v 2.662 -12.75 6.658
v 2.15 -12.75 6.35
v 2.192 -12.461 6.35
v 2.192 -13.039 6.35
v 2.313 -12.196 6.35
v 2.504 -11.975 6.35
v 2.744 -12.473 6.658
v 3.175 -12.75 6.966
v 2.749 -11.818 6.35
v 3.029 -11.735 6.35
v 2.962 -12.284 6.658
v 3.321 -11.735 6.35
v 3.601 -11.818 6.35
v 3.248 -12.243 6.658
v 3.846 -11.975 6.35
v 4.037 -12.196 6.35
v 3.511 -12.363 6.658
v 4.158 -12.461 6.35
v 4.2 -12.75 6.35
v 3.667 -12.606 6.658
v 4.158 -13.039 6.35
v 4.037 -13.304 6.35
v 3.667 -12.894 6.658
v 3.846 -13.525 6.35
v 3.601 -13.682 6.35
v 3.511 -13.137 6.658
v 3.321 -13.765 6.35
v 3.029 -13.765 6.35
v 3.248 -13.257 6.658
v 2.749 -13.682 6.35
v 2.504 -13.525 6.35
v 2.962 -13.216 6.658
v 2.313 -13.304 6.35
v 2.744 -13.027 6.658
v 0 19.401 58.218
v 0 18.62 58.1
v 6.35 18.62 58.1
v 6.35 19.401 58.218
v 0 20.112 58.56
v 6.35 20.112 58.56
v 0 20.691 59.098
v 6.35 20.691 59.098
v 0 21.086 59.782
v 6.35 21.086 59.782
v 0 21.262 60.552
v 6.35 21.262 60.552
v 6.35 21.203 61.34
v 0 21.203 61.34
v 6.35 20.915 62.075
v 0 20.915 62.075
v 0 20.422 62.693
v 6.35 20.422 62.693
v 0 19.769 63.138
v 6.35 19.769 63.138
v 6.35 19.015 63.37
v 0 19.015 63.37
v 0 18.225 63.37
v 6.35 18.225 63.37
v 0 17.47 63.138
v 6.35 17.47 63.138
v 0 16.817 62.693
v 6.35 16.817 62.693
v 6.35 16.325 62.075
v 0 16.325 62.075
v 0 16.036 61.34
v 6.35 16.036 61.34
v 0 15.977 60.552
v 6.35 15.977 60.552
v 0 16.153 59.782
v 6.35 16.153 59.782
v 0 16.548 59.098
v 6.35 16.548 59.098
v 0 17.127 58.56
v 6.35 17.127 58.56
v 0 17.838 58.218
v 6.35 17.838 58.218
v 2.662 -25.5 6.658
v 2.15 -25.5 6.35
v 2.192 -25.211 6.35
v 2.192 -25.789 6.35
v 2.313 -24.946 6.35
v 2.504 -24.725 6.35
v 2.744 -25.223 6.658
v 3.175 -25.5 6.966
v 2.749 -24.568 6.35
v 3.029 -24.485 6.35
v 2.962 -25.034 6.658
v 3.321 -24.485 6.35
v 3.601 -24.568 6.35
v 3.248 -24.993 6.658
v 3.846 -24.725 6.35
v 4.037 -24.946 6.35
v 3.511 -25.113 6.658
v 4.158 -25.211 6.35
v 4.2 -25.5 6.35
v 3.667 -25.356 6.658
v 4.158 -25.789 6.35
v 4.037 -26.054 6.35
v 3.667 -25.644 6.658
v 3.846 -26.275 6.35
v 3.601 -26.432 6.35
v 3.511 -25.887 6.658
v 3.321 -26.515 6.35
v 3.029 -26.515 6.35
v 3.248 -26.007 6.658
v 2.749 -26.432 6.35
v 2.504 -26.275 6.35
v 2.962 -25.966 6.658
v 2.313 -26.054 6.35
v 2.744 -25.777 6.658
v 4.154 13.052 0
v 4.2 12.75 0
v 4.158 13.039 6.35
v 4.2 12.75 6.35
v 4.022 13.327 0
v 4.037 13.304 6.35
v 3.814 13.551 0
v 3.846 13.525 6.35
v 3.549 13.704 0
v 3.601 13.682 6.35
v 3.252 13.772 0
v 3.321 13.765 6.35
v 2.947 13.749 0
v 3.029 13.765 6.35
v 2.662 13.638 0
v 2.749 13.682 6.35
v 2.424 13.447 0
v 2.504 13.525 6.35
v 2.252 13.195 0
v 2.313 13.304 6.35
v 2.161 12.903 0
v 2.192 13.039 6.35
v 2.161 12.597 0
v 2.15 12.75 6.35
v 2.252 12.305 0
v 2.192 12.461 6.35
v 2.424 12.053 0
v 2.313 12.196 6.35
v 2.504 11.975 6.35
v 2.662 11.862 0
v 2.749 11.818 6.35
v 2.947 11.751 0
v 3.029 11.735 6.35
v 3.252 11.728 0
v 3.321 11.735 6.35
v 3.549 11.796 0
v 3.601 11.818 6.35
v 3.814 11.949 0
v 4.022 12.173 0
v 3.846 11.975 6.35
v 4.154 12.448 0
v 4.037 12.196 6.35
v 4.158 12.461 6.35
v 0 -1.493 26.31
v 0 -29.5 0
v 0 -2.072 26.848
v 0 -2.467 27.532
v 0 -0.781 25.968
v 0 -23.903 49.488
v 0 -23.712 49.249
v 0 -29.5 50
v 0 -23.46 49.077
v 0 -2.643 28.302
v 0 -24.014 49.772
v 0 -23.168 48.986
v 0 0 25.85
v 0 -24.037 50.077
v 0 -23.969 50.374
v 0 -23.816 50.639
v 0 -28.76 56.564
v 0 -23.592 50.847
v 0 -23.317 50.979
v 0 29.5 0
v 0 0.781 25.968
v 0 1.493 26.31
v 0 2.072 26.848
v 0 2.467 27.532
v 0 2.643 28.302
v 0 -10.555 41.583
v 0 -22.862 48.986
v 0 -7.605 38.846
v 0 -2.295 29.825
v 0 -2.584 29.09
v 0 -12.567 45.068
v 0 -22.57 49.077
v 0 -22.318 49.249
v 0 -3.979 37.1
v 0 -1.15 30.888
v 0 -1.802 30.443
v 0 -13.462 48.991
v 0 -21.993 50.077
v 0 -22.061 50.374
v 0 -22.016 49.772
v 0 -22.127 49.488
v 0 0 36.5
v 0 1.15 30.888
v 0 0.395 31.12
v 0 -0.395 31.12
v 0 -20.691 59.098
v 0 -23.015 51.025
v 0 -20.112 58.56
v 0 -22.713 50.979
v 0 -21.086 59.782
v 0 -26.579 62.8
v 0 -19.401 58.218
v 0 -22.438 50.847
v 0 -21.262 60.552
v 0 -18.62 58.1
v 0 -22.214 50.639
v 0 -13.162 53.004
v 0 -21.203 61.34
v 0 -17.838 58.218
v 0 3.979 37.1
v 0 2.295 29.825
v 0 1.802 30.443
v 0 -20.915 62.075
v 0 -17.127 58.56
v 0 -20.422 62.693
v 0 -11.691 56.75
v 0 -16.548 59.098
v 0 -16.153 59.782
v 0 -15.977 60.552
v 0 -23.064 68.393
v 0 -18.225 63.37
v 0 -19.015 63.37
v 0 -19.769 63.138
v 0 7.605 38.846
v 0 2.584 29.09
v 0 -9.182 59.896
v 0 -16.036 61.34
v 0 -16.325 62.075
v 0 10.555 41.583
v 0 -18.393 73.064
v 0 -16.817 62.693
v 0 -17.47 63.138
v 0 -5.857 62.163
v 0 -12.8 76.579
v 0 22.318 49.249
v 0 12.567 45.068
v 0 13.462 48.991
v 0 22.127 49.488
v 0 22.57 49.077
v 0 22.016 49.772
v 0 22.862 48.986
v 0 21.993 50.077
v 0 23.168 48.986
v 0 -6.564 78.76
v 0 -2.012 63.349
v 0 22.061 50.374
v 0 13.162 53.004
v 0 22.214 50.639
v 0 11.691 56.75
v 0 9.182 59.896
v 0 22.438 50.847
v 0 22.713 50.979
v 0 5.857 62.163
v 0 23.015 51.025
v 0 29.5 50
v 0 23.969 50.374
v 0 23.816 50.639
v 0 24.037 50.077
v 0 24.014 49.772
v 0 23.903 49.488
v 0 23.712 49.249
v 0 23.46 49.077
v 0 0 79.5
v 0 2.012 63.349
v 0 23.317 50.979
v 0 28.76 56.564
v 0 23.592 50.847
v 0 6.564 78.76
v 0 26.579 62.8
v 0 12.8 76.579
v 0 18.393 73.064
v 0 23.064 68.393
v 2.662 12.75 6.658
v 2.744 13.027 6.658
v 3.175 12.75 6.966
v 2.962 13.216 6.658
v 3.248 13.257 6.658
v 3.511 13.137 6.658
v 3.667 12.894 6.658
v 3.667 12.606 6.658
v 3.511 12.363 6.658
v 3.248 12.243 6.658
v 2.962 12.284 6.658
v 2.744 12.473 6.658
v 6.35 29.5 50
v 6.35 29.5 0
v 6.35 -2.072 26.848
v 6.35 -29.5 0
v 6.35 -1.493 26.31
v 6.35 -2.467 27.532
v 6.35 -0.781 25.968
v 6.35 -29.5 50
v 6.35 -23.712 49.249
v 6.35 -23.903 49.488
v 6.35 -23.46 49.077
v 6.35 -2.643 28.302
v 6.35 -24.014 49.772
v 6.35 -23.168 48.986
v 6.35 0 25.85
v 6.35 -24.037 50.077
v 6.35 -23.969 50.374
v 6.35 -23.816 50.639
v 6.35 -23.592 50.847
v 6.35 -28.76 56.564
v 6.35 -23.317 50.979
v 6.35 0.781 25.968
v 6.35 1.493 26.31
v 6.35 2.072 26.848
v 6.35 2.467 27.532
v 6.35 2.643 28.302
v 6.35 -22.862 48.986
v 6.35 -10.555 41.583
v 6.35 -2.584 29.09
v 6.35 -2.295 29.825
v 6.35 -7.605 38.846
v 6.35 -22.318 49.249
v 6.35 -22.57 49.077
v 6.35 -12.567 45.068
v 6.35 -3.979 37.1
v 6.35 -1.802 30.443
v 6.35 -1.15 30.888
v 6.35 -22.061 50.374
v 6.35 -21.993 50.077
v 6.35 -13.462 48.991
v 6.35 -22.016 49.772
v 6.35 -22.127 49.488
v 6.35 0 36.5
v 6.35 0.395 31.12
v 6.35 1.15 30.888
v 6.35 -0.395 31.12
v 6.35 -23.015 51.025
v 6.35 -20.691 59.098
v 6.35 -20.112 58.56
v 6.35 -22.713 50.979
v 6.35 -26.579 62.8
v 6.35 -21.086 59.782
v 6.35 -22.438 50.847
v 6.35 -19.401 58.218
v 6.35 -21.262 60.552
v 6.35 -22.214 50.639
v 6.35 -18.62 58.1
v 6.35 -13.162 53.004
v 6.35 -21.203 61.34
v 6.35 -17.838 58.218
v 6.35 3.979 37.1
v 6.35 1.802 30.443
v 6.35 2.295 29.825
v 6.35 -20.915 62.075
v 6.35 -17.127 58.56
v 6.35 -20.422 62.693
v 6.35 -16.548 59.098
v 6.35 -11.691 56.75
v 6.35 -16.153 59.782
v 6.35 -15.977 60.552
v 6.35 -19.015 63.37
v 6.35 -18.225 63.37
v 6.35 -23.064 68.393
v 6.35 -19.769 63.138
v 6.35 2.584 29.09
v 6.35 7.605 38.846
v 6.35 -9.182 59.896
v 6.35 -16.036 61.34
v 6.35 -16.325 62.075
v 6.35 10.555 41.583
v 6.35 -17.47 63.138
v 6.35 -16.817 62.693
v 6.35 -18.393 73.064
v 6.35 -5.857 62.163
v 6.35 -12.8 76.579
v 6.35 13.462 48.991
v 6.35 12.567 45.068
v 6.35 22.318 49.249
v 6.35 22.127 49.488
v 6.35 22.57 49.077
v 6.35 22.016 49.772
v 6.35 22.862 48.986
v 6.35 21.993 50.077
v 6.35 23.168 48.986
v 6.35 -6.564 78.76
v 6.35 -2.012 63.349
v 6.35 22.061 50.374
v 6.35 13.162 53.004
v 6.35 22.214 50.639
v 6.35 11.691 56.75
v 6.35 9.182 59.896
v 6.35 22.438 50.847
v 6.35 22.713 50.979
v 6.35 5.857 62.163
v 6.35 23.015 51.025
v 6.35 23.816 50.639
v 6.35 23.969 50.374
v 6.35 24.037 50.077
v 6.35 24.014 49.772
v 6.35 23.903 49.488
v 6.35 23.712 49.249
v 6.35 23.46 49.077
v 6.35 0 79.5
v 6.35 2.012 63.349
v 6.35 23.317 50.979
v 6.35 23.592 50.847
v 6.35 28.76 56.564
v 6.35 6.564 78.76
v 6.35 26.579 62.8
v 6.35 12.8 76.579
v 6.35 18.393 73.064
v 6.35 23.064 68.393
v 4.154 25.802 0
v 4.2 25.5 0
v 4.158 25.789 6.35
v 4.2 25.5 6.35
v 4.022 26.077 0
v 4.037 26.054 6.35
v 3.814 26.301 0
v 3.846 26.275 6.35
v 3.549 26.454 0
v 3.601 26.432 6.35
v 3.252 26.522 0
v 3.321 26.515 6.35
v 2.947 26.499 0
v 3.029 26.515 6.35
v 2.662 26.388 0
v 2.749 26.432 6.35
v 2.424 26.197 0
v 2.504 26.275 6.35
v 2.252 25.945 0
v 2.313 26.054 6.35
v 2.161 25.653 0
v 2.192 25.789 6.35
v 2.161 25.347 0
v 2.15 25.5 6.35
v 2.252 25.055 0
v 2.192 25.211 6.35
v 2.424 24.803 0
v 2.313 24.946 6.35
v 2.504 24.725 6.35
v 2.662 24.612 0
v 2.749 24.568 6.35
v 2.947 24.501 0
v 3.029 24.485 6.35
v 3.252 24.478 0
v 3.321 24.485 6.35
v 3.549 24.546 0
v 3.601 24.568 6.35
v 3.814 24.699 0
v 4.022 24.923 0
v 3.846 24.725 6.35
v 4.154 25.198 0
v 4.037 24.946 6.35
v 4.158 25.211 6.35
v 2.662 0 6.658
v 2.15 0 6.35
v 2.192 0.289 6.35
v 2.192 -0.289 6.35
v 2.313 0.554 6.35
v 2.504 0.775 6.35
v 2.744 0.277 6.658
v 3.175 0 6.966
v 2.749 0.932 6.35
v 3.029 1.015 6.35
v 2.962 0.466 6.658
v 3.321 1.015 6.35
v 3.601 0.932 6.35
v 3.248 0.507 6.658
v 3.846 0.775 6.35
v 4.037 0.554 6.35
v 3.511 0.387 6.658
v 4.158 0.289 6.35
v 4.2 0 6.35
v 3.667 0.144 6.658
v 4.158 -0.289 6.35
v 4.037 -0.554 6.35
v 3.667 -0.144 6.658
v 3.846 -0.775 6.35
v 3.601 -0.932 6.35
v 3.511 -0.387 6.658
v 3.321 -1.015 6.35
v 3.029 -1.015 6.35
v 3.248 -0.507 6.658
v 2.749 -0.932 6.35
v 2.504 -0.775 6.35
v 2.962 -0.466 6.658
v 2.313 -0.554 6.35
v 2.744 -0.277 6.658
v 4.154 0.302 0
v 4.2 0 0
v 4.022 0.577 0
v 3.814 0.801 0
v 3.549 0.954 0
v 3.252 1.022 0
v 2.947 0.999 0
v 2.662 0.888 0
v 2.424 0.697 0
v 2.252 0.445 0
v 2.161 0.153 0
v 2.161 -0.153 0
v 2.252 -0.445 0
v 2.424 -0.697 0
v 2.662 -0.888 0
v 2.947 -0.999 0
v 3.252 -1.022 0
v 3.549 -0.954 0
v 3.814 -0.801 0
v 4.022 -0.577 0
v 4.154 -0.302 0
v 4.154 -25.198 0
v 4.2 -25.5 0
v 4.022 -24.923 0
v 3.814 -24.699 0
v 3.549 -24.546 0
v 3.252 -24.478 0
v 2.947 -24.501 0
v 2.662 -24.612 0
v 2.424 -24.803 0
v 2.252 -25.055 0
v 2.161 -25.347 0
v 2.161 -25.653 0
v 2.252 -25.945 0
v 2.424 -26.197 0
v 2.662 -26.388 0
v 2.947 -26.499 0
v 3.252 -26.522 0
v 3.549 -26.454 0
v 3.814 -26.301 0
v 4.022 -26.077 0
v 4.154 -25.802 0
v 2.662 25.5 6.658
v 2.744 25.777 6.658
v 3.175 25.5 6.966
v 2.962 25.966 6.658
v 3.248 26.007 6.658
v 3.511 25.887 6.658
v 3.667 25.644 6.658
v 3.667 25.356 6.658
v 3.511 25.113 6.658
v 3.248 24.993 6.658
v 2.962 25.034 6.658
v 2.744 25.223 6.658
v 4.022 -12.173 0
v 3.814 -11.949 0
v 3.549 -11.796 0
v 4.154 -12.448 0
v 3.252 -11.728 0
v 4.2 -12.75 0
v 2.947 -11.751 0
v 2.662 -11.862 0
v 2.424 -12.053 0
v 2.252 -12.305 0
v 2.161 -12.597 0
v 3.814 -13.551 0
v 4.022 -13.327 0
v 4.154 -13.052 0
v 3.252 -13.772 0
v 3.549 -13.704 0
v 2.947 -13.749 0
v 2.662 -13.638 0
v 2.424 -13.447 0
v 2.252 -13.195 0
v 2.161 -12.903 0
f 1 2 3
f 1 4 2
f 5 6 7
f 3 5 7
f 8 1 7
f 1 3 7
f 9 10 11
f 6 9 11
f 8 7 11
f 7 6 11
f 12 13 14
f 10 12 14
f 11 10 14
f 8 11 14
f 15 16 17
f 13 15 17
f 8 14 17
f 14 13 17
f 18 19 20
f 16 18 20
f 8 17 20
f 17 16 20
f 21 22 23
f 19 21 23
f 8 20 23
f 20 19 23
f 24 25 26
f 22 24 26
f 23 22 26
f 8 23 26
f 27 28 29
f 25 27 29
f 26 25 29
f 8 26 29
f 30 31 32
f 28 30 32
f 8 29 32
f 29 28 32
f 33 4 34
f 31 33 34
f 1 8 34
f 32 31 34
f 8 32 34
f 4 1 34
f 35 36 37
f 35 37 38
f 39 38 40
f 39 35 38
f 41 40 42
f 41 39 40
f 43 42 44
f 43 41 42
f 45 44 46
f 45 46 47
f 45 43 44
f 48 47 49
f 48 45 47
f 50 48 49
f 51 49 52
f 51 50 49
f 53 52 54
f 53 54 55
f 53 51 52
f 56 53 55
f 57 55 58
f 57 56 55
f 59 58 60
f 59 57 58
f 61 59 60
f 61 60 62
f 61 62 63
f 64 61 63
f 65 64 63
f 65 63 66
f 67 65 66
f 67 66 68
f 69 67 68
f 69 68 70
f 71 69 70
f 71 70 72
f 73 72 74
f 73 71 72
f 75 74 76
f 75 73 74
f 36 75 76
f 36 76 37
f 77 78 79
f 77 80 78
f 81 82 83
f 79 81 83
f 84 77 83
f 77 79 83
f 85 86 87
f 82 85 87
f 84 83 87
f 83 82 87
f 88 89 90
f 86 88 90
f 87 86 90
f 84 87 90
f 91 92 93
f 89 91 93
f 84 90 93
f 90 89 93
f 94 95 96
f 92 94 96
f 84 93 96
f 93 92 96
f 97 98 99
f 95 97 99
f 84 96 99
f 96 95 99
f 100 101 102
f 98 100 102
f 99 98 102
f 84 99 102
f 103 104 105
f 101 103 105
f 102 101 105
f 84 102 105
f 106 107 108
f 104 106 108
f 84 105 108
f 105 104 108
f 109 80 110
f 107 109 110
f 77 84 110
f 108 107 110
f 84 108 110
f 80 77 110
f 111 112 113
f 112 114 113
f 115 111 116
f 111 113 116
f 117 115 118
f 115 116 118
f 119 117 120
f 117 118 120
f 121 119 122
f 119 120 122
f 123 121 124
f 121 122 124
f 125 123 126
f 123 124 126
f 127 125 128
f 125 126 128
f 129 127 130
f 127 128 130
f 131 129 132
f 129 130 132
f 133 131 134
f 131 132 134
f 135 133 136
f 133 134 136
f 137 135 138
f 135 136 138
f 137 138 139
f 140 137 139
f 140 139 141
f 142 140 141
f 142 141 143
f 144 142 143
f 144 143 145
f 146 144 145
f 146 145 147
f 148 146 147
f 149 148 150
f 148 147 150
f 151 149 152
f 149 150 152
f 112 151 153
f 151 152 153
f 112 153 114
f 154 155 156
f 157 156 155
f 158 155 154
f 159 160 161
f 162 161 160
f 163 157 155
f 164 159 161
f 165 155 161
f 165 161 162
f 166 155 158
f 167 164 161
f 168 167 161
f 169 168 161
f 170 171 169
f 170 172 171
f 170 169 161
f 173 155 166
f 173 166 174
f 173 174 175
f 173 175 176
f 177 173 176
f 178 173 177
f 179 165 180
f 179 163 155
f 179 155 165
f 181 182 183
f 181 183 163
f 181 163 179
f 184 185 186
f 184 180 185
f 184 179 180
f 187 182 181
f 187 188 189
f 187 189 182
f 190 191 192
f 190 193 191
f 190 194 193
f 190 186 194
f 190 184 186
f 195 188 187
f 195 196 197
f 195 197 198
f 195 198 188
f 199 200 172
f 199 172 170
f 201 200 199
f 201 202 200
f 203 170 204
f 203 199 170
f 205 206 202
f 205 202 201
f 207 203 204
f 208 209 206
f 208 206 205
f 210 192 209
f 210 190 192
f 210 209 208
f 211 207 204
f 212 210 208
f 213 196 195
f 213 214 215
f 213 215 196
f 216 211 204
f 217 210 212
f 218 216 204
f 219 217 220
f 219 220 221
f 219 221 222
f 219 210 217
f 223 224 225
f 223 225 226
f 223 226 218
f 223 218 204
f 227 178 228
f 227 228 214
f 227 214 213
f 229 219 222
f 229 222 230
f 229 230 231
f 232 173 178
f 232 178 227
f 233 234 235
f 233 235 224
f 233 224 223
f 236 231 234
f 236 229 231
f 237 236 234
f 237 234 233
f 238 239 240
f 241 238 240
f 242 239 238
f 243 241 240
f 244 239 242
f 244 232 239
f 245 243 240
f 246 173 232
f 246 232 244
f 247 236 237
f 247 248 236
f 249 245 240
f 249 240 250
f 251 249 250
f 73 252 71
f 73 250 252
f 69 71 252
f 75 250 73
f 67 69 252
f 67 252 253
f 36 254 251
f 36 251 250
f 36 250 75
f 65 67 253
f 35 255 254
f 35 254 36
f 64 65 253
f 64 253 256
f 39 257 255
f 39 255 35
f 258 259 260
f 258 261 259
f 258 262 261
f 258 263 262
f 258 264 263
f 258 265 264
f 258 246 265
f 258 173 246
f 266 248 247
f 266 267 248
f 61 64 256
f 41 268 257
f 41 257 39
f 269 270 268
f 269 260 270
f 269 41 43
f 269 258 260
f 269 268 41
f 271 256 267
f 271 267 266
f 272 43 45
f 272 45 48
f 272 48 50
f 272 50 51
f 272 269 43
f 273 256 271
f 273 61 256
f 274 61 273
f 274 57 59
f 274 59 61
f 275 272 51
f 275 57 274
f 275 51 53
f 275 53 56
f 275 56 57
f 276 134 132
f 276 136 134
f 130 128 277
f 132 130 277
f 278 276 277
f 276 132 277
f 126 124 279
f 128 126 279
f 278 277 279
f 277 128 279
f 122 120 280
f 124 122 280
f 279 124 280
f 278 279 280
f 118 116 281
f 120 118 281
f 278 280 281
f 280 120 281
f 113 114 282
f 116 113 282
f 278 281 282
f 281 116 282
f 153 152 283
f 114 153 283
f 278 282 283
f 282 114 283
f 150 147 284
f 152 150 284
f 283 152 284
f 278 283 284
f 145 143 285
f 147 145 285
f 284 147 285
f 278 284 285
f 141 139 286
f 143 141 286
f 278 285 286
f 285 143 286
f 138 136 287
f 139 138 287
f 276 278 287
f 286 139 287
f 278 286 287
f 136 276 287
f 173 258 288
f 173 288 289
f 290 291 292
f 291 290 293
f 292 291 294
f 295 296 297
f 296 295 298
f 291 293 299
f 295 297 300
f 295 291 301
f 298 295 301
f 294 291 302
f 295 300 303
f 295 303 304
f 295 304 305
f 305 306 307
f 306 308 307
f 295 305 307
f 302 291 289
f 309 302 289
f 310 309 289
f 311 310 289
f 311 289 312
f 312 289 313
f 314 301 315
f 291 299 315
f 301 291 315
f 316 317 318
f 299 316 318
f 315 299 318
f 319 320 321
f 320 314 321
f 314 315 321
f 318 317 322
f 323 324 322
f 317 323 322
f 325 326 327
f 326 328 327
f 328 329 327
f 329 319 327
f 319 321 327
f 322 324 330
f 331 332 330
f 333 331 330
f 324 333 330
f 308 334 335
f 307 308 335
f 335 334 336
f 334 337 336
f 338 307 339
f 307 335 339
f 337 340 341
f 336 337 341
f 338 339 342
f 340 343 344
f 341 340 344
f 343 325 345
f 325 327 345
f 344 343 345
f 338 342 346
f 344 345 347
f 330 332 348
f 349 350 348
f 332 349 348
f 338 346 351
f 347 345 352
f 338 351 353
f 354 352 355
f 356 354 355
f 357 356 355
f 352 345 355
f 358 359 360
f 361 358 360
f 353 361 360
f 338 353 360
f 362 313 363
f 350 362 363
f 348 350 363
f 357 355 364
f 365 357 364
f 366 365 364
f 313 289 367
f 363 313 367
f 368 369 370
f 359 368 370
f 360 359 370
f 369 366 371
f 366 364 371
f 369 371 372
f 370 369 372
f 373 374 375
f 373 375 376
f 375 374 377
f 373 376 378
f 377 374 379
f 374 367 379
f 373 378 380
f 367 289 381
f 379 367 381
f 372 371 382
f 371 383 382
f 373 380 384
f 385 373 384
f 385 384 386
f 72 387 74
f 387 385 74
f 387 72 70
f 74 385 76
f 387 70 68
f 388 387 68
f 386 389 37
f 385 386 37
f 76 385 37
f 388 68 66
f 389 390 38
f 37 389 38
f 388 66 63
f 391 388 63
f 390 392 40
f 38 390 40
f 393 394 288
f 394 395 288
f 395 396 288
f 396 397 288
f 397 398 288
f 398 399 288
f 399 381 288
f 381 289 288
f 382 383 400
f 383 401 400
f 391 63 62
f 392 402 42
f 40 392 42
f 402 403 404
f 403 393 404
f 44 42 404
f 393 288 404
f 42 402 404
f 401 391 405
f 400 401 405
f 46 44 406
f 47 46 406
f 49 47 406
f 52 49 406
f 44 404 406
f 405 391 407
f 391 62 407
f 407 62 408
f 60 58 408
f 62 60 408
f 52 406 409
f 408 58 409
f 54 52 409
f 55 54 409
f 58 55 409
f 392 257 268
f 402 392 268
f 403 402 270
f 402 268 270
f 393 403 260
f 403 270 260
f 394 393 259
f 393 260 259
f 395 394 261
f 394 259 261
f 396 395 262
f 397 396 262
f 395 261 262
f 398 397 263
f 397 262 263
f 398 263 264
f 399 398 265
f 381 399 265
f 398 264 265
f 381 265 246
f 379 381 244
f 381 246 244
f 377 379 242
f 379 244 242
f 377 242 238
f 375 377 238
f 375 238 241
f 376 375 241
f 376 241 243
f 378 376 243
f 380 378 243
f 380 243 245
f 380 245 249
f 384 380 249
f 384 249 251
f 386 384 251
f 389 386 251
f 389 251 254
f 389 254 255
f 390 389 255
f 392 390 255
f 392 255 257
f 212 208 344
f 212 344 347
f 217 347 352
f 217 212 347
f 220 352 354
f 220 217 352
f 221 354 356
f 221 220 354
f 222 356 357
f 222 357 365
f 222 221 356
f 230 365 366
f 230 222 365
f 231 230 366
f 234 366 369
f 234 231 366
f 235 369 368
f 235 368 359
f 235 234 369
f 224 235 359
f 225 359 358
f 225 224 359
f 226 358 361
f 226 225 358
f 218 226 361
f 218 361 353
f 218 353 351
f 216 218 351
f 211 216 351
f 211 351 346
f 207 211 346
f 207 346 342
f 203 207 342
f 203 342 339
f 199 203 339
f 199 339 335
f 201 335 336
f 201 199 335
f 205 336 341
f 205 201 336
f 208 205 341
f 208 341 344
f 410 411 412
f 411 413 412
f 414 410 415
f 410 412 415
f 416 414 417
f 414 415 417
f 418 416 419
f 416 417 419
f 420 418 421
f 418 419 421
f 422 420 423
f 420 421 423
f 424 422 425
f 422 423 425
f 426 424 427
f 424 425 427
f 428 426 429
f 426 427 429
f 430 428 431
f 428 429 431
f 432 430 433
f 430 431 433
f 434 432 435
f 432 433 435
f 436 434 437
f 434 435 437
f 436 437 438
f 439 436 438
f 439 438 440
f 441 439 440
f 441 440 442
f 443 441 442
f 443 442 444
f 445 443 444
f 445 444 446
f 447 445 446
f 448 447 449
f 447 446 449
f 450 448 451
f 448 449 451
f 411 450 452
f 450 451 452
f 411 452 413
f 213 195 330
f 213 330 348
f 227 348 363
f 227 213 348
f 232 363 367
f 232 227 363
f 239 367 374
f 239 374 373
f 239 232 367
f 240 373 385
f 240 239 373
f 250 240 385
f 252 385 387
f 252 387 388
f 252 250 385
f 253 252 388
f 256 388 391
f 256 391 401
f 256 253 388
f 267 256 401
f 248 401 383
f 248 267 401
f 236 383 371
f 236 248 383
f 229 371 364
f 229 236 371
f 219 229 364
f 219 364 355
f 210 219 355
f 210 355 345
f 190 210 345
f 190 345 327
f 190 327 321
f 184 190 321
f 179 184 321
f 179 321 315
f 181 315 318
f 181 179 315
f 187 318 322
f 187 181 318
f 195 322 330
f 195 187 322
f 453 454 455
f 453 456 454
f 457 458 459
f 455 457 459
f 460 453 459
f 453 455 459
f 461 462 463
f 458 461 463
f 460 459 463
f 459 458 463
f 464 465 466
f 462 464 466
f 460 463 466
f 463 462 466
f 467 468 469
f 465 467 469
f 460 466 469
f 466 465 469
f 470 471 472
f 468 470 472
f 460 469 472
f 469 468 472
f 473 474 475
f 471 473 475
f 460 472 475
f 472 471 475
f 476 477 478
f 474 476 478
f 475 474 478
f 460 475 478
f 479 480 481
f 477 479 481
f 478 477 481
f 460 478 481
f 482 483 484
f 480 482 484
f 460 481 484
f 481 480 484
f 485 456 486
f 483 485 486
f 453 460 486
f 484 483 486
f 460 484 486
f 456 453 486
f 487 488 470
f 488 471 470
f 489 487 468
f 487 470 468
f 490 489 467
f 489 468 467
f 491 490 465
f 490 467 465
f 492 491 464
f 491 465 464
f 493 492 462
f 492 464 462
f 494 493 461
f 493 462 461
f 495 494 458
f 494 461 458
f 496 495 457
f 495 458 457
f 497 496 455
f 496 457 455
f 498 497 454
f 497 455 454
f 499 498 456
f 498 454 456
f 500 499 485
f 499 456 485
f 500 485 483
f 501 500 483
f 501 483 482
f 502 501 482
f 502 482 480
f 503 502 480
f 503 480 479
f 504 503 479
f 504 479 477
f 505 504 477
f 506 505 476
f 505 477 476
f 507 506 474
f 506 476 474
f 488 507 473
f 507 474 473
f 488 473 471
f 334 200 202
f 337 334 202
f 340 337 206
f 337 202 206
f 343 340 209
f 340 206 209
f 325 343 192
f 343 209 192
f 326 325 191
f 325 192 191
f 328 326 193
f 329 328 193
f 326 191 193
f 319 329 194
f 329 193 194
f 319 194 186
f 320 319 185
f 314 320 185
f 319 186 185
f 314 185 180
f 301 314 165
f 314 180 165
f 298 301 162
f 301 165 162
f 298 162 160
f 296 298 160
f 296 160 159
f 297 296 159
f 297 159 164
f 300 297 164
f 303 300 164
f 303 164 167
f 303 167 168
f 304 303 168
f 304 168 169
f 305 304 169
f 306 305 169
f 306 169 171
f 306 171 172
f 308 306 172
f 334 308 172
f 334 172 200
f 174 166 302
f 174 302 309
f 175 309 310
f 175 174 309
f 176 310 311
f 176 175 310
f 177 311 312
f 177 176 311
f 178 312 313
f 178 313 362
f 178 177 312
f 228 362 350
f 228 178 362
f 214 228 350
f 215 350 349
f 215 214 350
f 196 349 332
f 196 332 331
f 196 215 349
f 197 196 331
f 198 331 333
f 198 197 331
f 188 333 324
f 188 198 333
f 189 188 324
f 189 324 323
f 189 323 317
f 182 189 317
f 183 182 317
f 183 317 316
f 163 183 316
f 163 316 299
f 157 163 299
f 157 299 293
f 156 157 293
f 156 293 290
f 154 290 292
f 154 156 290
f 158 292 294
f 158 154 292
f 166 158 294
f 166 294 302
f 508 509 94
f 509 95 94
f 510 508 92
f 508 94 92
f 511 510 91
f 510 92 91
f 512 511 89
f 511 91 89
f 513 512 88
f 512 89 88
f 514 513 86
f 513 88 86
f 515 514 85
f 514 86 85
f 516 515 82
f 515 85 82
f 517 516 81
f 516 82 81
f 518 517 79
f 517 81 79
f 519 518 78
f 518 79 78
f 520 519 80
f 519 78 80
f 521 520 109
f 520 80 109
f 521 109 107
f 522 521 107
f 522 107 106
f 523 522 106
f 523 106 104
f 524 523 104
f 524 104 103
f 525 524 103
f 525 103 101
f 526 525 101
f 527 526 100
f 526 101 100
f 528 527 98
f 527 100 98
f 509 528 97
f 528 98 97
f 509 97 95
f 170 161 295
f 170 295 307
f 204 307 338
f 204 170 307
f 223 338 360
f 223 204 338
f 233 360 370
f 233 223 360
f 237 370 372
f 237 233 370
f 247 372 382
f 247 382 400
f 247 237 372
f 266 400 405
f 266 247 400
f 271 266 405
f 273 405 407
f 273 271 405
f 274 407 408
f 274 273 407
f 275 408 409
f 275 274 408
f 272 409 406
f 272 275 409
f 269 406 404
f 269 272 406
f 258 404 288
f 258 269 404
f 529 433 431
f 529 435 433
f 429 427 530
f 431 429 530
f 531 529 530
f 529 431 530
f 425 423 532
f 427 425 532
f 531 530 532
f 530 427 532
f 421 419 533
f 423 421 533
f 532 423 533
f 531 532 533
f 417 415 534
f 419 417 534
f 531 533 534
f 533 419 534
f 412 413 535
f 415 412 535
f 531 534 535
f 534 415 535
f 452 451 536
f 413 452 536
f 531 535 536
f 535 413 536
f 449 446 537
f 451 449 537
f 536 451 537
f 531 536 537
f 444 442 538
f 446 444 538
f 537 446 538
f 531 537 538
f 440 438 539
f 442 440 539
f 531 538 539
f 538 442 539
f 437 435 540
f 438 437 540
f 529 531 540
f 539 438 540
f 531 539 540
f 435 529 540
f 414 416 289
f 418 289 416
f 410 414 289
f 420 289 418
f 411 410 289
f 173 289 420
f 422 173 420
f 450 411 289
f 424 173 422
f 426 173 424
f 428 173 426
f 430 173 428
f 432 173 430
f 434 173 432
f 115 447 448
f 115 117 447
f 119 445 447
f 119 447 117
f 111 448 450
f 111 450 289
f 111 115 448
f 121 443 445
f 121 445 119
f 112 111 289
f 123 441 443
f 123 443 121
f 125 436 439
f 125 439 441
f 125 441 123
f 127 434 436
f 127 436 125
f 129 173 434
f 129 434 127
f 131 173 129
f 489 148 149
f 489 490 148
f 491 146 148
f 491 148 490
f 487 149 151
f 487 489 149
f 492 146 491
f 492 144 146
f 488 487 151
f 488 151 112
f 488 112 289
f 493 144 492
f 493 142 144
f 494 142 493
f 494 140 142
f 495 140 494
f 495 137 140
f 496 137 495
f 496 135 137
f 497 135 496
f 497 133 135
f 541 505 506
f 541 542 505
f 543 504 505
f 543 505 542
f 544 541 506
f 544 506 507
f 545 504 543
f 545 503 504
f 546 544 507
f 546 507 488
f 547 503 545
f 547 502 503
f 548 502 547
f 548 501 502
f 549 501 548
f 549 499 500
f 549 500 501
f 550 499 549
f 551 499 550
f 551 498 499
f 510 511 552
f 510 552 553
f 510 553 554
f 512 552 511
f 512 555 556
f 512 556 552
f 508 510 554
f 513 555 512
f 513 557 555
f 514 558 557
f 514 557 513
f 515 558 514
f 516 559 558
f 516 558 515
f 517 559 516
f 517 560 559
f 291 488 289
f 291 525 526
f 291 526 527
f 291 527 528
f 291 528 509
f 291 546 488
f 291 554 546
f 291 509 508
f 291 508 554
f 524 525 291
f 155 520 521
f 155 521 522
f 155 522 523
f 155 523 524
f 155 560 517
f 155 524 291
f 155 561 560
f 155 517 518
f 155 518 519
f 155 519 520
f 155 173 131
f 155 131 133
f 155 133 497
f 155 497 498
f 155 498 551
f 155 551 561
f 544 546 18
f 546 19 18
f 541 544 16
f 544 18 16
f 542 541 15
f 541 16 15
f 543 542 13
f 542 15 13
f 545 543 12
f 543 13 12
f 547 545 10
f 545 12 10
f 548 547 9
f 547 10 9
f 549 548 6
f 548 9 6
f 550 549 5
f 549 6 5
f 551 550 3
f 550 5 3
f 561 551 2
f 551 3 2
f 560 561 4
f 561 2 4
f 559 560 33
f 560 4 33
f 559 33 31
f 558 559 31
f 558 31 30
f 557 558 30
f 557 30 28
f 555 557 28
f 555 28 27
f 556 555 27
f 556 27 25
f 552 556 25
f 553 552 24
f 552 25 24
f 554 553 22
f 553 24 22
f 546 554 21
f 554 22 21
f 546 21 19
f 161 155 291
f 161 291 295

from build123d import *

# Parameters (mm, degrees)
SKETCH1_R                    = 2.65
SKETCH1_R_2                  = 13.5
BOSS_EXTRUDE1_DEPTH          = 6.35
M2_5X0_45_TAPPED_HOLE1_D     = 2.05
M2_5X0_45_TAPPED_HOLE2_D     = 2.05
M2_5X0_45_TAPPED_HOLE2_DEPTH = 6.35
M2_5X0_45_TAPPED_HOLE2_TIP   = 0.615882135


with BuildPart() as part:
    # Sketch1 → Boss-Extrude1 (new body)
    with BuildSketch(Plane(origin=(0, 0, 0), x_dir=(0, 0, -1), z_dir=(1, 0, 0))):
        with BuildLine():
            Line((-50, 29.5), (0, 29.5))
            Line((0, 29.5), (0, -29.5))
            Line((0, -29.5), (-50, -29.5))
            ThreePointArc((-50, -29.5), (-79.5, 0), (-50, 29.5))
        make_face()
        with Locations((-60.75, -18.619546181)):
            Circle(SKETCH1_R, mode=Mode.SUBTRACT)
        with Locations((-28.5, 0)):
            Circle(SKETCH1_R, mode=Mode.SUBTRACT)
        with Locations((-60.75, 18.619546181)):
            Circle(SKETCH1_R, mode=Mode.SUBTRACT)
        with Locations((-50, 0)):
            Circle(SKETCH1_R_2, mode=Mode.SUBTRACT)
    extrude(amount=BOSS_EXTRUDE1_DEPTH)

    # M2.5x0.45 Tapped Hole1 (through all)
    with Locations(Plane(origin=(6.35, 0, 0), x_dir=(0, 0, -1), z_dir=(1, 0, 0))):
        with Locations((-50, -23.015), (-50, 23.015)):
            Hole(M2_5X0_45_TAPPED_HOLE1_D / 2)

    # M2.5x0.45 Tapped Hole2
    with Locations(Plane(origin=(0, 0, 0), x_dir=(-1, 0, 0), z_dir=(0, 0, -1))):
        with Locations((-3.175, 0), (-3.175, 12.75), (-3.175, 25.5), (-3.175, -12.75), (-3.175, -25.5)):
            Hole(M2_5X0_45_TAPPED_HOLE2_D / 2, depth=M2_5X0_45_TAPPED_HOLE2_DEPTH)
            with Locations((0, 0, -(M2_5X0_45_TAPPED_HOLE2_DEPTH + M2_5X0_45_TAPPED_HOLE2_TIP / 2))):  # 118° drill point
                Cone(0, M2_5X0_45_TAPPED_HOLE2_D / 2, M2_5X0_45_TAPPED_HOLE2_TIP, mode=Mode.SUBTRACT)


solid = part.part
